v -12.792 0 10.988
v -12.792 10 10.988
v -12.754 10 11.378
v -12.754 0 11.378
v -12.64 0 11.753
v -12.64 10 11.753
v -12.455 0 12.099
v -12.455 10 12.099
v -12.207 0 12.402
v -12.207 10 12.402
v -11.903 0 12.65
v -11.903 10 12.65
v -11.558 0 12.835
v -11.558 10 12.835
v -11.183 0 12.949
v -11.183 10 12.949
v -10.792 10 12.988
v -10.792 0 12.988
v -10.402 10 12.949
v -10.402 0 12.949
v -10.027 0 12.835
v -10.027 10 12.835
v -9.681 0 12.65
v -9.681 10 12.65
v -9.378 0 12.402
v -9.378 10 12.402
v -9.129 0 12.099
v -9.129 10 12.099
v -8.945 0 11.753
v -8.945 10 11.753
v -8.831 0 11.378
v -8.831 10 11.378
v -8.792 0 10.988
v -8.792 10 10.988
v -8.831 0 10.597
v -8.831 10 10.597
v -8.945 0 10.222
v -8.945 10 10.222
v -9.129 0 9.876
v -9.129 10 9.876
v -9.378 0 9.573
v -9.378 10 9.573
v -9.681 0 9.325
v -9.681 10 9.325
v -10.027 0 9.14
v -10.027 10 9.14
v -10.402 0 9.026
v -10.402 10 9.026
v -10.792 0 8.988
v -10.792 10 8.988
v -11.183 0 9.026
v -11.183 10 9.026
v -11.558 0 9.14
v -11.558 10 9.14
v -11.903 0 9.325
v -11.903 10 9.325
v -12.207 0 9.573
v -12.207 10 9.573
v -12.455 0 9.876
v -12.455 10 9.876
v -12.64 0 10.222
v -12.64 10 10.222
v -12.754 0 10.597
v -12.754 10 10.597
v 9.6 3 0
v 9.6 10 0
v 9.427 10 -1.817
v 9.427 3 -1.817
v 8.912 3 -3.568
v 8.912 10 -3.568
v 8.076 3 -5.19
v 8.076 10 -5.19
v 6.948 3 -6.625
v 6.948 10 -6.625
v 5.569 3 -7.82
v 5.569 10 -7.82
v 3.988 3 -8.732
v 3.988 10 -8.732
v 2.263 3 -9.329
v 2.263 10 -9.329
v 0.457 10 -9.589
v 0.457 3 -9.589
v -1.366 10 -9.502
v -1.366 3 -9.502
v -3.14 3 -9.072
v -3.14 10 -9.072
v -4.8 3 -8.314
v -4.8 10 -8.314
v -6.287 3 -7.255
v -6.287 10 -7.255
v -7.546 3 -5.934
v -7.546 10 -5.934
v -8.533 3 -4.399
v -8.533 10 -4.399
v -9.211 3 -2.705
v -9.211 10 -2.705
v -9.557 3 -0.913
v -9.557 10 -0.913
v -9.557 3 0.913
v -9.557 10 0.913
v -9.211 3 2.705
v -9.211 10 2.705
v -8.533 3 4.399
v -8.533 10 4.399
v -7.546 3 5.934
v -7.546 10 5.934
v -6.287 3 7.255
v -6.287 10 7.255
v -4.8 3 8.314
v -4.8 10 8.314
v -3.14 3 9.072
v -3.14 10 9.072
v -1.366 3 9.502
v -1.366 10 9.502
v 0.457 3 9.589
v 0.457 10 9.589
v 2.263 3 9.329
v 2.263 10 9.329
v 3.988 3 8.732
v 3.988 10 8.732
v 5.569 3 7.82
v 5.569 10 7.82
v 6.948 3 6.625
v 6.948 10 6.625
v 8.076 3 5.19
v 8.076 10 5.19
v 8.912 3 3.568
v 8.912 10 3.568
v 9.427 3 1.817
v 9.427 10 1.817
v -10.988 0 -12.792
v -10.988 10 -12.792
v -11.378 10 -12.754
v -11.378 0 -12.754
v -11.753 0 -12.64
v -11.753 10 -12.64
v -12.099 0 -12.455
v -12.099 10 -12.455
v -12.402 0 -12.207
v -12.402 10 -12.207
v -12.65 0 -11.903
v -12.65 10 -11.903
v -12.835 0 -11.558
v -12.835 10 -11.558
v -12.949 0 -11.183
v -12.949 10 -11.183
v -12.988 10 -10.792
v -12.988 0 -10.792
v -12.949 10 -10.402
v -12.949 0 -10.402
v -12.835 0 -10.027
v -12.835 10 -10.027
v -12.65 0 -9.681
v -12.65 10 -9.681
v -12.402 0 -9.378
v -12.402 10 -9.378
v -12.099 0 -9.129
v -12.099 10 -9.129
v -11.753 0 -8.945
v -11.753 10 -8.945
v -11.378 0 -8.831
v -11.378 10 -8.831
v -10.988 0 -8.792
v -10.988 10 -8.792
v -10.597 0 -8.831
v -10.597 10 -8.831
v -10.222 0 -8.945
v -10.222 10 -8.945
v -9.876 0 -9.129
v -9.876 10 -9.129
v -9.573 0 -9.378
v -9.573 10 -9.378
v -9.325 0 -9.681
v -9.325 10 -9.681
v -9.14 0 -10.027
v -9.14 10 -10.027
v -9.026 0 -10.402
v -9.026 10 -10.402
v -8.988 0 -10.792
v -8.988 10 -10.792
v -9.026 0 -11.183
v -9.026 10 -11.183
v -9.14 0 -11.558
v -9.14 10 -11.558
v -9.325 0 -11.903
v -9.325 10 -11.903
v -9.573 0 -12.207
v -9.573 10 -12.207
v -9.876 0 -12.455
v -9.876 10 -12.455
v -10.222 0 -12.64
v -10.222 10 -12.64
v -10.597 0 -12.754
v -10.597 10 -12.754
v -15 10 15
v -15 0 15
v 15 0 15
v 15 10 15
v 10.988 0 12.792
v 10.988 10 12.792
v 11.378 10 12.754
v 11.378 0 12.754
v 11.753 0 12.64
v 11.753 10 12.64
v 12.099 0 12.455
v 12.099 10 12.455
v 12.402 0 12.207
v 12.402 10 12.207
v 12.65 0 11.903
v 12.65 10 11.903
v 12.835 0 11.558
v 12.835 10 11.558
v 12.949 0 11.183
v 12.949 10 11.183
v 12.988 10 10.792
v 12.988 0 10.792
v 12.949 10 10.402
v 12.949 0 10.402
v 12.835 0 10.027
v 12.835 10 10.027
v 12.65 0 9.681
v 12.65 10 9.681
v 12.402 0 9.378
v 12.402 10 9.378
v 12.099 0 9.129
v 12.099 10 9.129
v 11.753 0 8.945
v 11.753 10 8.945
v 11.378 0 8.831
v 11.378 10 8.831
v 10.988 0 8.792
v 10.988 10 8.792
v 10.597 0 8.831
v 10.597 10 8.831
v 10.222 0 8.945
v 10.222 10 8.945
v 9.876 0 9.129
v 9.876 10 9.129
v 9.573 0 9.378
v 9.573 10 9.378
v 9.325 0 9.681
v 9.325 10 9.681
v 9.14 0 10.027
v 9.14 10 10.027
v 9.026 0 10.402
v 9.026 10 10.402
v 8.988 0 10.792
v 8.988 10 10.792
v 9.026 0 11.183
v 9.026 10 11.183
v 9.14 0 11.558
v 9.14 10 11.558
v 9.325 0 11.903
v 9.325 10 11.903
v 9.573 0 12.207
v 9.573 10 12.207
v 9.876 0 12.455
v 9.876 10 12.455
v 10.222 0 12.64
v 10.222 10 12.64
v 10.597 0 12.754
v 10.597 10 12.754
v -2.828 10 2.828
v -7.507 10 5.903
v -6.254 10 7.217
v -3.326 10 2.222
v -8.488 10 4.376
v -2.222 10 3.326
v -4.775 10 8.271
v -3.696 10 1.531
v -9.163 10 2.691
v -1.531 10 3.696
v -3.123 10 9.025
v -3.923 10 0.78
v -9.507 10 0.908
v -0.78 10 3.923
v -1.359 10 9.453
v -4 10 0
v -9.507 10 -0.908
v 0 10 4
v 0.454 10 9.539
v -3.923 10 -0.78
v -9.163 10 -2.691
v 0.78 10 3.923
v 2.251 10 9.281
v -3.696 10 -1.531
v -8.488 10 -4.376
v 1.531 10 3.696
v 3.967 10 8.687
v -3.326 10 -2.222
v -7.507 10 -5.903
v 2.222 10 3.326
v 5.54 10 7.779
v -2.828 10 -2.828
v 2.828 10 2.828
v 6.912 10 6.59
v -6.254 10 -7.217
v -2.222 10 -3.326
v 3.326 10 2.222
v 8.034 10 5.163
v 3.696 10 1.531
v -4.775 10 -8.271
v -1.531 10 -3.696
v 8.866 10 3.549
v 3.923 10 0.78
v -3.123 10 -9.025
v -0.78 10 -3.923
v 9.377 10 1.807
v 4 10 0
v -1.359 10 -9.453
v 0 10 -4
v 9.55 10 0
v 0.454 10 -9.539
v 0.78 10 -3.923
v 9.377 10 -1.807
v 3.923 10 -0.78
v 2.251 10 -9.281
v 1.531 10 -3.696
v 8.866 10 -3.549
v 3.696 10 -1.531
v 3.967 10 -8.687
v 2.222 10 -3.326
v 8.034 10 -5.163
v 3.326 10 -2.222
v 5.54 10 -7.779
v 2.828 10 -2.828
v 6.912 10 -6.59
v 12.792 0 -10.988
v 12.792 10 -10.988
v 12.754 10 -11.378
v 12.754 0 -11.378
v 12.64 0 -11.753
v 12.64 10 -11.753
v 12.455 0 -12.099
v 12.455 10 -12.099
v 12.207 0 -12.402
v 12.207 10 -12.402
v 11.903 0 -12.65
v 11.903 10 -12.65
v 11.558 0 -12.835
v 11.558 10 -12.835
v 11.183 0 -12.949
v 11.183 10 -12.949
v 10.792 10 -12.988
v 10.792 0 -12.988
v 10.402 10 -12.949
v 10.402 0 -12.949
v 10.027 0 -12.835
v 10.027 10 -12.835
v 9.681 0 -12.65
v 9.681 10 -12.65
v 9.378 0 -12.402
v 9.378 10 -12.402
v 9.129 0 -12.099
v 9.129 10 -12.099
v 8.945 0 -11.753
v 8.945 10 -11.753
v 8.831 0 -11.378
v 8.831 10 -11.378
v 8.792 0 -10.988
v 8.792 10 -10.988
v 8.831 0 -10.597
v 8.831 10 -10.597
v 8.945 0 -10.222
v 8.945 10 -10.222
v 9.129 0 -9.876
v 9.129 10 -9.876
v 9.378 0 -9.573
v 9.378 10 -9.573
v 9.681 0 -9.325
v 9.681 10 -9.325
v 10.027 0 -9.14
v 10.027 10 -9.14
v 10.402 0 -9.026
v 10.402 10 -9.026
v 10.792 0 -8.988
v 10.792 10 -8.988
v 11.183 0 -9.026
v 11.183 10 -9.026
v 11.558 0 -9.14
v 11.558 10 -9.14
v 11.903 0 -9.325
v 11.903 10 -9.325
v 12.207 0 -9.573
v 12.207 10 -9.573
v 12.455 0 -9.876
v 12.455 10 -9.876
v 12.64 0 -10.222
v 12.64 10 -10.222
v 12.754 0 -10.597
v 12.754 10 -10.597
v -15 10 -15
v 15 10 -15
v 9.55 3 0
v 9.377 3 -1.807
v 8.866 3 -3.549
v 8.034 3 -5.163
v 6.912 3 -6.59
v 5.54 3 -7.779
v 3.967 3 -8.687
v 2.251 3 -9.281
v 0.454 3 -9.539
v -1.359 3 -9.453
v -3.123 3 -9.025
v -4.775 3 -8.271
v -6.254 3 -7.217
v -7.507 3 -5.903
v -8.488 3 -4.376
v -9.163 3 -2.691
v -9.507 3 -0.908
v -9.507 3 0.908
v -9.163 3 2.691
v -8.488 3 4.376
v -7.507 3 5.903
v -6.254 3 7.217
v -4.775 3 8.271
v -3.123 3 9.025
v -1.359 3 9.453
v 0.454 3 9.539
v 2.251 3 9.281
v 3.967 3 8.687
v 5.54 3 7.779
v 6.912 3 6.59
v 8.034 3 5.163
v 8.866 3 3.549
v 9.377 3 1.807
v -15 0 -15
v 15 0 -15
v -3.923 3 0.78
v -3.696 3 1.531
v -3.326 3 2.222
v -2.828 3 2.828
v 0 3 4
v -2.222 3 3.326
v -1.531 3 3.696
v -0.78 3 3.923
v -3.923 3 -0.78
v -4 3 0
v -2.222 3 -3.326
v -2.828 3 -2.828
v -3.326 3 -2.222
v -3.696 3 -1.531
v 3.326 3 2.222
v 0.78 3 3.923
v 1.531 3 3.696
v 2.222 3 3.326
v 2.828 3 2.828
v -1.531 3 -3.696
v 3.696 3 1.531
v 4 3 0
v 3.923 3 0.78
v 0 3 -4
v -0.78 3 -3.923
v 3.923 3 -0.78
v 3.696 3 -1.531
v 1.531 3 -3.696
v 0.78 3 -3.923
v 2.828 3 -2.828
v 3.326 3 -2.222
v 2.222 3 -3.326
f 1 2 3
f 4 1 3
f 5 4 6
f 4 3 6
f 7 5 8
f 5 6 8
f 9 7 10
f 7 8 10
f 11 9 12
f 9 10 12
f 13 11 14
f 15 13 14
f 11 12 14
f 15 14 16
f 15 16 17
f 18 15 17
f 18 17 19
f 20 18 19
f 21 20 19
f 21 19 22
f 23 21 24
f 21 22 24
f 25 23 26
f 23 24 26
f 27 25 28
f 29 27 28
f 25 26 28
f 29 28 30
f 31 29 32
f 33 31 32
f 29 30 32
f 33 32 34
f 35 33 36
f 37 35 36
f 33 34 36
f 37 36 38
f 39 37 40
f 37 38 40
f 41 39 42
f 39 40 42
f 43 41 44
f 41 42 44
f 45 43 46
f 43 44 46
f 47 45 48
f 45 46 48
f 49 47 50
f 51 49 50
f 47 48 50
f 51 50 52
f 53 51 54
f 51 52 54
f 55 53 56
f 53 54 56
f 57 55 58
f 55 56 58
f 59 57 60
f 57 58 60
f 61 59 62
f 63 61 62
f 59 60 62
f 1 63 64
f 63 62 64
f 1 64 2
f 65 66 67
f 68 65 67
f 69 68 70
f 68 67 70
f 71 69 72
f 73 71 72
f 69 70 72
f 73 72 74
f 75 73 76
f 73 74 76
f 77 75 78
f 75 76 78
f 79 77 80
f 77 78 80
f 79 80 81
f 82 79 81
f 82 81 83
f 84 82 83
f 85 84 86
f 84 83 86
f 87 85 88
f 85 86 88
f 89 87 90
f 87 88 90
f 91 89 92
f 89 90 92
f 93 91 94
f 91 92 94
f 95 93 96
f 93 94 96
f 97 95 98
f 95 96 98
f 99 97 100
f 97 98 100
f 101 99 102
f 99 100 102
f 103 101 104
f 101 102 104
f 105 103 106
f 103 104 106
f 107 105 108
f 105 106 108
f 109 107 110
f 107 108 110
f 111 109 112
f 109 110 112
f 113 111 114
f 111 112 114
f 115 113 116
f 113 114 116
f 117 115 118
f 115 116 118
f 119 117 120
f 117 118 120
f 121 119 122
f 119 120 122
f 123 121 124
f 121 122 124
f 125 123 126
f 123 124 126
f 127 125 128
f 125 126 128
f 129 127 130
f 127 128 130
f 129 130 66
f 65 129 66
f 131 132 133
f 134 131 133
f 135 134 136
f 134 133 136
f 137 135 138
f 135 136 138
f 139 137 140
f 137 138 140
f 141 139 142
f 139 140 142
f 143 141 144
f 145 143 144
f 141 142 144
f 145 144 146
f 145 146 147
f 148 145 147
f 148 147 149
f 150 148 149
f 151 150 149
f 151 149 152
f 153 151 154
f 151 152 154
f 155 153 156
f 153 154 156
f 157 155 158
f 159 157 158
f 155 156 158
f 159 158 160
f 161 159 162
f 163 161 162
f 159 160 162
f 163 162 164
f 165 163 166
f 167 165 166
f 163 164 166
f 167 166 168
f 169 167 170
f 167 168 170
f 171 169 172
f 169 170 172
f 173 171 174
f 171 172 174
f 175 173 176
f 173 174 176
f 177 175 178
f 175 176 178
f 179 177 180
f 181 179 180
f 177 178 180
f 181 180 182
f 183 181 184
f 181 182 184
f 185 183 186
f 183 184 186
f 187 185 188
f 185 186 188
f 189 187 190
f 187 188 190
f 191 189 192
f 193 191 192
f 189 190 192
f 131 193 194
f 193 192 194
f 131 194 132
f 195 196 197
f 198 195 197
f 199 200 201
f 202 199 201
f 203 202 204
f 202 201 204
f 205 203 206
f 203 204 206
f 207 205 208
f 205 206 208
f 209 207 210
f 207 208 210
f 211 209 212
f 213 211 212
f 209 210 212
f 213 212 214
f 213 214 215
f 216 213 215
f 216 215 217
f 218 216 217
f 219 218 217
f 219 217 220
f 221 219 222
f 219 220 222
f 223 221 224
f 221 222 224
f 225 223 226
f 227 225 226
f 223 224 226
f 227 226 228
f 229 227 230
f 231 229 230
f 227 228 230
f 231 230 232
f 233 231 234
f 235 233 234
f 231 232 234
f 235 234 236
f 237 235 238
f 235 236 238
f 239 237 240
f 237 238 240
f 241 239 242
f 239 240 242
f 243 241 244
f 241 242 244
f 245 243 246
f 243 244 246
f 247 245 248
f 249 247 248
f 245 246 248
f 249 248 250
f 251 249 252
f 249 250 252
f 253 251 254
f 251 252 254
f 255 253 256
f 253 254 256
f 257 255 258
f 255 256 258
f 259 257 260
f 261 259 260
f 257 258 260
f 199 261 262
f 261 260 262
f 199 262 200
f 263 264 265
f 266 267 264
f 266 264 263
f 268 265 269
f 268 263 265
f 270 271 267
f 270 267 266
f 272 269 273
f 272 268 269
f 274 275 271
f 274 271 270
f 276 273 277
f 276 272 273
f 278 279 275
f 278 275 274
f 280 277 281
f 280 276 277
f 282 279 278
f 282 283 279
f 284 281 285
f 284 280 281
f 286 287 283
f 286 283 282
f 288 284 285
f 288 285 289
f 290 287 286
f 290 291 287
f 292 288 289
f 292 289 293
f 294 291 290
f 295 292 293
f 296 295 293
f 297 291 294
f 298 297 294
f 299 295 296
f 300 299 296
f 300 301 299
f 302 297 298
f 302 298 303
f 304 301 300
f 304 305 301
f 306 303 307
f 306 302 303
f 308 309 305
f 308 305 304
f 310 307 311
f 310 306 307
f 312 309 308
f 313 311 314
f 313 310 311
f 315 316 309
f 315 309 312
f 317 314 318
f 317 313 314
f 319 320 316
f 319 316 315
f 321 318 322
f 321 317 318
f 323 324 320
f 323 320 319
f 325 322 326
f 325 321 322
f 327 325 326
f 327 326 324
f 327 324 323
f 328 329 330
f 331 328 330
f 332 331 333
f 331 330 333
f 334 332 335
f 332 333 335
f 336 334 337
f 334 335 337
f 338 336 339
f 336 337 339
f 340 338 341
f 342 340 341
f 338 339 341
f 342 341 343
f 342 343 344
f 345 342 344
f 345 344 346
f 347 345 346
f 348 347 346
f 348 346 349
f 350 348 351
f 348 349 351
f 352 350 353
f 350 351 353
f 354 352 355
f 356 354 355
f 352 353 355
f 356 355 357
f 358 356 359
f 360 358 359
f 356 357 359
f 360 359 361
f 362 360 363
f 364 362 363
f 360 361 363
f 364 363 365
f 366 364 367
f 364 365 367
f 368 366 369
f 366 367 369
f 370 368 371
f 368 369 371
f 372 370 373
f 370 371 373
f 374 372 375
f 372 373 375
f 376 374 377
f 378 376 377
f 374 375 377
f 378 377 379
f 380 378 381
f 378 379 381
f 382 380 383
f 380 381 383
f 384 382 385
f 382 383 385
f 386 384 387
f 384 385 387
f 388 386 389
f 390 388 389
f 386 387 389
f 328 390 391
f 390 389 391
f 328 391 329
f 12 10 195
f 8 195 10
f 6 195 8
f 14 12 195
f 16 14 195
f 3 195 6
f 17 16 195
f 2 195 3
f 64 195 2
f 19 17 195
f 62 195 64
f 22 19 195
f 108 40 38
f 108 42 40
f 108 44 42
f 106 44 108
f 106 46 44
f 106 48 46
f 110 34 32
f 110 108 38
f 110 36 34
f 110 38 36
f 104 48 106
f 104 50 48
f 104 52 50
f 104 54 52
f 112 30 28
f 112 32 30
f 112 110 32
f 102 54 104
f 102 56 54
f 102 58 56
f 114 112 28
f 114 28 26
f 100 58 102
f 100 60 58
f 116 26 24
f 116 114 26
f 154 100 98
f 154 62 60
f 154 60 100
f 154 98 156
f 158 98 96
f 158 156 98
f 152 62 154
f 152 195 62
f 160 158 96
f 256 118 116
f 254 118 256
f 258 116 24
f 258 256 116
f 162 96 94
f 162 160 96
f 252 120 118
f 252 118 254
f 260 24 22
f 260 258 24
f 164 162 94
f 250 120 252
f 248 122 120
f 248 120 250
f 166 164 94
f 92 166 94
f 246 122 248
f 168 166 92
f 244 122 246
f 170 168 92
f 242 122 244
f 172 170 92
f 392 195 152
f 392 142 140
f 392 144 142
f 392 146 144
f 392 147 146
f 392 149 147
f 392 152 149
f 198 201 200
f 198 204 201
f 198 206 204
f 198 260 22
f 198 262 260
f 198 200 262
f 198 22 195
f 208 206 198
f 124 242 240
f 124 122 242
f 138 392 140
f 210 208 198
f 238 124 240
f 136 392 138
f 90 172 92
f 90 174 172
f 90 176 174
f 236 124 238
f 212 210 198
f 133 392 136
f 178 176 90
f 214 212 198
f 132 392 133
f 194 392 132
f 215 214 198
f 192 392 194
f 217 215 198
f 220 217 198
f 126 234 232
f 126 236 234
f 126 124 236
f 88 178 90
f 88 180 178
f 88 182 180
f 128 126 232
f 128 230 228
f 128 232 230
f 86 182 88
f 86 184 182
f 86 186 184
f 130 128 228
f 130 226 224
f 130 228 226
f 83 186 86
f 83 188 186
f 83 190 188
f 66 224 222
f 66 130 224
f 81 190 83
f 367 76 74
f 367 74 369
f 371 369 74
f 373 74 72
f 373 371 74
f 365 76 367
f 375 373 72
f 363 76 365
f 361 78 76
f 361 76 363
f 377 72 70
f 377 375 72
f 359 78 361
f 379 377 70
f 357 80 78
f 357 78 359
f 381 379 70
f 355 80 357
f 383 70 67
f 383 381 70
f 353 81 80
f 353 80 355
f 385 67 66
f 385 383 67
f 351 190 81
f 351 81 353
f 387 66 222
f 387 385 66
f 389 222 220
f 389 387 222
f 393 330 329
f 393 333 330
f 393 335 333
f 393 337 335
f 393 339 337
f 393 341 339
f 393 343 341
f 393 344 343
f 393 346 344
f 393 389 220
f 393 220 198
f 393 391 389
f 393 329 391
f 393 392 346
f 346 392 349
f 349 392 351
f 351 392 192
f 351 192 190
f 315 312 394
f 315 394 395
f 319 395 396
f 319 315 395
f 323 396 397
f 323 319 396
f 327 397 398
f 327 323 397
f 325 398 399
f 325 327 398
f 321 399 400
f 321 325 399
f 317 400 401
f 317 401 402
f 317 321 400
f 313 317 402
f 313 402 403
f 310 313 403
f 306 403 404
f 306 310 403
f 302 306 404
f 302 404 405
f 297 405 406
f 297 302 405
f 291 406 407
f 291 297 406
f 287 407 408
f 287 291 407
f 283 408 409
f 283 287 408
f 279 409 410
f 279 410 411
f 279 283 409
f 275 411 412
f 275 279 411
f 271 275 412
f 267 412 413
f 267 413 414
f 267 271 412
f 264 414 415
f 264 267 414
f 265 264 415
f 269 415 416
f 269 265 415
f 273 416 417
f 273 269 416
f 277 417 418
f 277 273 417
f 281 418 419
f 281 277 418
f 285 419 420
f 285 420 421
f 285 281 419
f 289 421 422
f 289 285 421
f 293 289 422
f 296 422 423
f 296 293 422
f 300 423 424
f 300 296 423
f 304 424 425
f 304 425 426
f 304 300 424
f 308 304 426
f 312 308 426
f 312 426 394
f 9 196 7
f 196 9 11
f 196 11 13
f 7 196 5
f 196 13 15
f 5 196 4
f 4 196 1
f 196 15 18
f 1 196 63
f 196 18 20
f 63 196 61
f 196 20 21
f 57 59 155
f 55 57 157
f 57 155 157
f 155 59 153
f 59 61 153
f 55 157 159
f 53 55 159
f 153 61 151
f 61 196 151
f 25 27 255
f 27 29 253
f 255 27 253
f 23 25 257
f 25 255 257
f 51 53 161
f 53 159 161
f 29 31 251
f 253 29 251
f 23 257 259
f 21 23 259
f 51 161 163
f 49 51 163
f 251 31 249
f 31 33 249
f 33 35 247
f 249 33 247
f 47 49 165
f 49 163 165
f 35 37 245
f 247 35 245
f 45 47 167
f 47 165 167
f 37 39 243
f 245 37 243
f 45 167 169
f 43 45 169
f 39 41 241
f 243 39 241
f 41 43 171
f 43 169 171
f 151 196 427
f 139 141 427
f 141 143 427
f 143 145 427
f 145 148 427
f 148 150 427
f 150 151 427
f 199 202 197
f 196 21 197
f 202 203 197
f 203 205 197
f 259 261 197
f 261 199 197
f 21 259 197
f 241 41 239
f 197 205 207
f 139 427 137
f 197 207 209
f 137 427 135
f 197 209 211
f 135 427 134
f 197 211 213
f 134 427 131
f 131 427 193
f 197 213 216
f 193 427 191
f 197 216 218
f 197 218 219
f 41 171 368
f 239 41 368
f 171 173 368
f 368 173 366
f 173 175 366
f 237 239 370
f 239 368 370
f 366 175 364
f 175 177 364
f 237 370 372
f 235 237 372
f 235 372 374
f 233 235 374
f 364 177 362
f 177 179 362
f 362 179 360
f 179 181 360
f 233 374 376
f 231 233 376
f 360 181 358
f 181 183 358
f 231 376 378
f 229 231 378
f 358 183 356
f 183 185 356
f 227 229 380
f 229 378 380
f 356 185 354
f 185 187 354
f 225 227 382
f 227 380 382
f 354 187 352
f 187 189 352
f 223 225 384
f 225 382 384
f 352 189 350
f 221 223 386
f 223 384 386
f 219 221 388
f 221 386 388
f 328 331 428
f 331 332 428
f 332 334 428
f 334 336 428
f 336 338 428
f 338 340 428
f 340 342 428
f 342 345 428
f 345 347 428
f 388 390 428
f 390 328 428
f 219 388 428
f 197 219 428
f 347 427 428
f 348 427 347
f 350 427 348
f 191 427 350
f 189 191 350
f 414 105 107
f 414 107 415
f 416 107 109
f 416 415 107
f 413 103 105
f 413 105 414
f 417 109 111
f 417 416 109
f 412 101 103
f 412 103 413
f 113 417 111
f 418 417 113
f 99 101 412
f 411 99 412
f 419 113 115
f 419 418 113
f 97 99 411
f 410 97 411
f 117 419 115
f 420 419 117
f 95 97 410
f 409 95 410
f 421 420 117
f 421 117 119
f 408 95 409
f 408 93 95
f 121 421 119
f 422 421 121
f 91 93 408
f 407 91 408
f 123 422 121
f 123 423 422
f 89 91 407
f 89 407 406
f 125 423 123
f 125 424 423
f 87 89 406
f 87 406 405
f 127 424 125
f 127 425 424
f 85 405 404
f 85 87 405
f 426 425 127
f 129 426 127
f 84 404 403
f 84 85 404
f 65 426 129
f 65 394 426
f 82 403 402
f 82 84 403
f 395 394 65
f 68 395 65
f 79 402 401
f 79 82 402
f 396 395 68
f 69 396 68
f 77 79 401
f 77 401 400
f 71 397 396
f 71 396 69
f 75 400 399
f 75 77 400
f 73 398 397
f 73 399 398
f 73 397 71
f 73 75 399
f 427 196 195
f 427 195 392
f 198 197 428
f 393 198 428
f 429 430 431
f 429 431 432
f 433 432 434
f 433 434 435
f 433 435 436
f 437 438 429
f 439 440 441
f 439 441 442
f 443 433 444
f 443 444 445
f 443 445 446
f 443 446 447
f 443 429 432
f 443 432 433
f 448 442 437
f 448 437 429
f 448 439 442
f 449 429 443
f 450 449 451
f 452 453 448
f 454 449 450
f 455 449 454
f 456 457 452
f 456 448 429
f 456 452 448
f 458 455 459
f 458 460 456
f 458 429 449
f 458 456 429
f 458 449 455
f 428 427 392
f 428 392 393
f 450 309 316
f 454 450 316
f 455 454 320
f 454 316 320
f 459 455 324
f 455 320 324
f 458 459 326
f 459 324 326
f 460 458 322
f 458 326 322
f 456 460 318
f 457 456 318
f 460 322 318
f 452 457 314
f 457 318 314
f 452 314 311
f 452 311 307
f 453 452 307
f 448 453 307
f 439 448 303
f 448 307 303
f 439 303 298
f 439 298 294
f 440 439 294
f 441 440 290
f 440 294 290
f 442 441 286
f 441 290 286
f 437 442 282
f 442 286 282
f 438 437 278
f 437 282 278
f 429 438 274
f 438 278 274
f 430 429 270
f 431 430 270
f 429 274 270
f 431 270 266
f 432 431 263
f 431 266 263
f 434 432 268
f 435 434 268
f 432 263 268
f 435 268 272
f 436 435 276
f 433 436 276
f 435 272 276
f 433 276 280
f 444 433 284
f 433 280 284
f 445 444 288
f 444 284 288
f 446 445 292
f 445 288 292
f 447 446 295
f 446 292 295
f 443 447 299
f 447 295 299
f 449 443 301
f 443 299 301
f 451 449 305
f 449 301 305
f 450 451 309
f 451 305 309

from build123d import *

# Parameters (mm, degrees)
SKETCH1_W           = 30
SKETCH1_H           = 30
BOSS_EXTRUDE1_DEPTH = 10
SKETCH2_R           = 9.6
SKETCH2_R_2         = 9.55
CUT_EXTRUDE1_DEPTH  = 7
SKETCH3_R           = 4
CUT_EXTRUDE2_DEPTH  = 7
SKETCH4_R           = 2
CUT_EXTRUDE3_DEPTH  = 10
CIRPATTERN1_COUNT   = 4


with BuildPart() as part:
    # Sketch1 → Boss-Extrude1 (new body)
    with BuildSketch(Plane(origin=(0, 0, 0), x_dir=(1, 0, 0), z_dir=(0, 1, 0))):
        Rectangle(SKETCH1_W, SKETCH1_H)
    extrude(amount=BOSS_EXTRUDE1_DEPTH)

    # Sketch2 → Cut-Extrude1 (cut)
    with BuildSketch(Plane(origin=(0, 10, 0), x_dir=(1, 0, 0), z_dir=(0, 1, 0))):
        Circle(SKETCH2_R)
        Circle(SKETCH2_R_2, mode=Mode.SUBTRACT)
    extrude(amount=-CUT_EXTRUDE1_DEPTH, mode=Mode.SUBTRACT)

    # Sketch3 → Cut-Extrude2 (cut)
    with BuildSketch(Plane(origin=(0, 10, 0), x_dir=(1, 0, 0), z_dir=(0, 1, 0))):
        Circle(SKETCH3_R)
    extrude(amount=-CUT_EXTRUDE2_DEPTH, mode=Mode.SUBTRACT)

    # Sketch4 → Cut-Extrude3 (cut)
    with BuildSketch(Plane(origin=(0, 10, 0), x_dir=(1, 0, 0), z_dir=(0, 1, 0))):
        with Locations((10.792349727, 10.987509758)):
            Circle(SKETCH4_R)
    cut_extrude3 = extrude(amount=-CUT_EXTRUDE3_DEPTH, mode=Mode.SUBTRACT)

    # CirPattern1: Cut-Extrude3 ×4 about axis
    cirpattern1_axis = Axis((0, 0, 0), (0, 1, 0))
    for i in range(1, CIRPATTERN1_COUNT):
        add(cut_extrude3.rotate(cirpattern1_axis, i * 360 / CIRPATTERN1_COUNT), mode=Mode.SUBTRACT)


solid = part.part
